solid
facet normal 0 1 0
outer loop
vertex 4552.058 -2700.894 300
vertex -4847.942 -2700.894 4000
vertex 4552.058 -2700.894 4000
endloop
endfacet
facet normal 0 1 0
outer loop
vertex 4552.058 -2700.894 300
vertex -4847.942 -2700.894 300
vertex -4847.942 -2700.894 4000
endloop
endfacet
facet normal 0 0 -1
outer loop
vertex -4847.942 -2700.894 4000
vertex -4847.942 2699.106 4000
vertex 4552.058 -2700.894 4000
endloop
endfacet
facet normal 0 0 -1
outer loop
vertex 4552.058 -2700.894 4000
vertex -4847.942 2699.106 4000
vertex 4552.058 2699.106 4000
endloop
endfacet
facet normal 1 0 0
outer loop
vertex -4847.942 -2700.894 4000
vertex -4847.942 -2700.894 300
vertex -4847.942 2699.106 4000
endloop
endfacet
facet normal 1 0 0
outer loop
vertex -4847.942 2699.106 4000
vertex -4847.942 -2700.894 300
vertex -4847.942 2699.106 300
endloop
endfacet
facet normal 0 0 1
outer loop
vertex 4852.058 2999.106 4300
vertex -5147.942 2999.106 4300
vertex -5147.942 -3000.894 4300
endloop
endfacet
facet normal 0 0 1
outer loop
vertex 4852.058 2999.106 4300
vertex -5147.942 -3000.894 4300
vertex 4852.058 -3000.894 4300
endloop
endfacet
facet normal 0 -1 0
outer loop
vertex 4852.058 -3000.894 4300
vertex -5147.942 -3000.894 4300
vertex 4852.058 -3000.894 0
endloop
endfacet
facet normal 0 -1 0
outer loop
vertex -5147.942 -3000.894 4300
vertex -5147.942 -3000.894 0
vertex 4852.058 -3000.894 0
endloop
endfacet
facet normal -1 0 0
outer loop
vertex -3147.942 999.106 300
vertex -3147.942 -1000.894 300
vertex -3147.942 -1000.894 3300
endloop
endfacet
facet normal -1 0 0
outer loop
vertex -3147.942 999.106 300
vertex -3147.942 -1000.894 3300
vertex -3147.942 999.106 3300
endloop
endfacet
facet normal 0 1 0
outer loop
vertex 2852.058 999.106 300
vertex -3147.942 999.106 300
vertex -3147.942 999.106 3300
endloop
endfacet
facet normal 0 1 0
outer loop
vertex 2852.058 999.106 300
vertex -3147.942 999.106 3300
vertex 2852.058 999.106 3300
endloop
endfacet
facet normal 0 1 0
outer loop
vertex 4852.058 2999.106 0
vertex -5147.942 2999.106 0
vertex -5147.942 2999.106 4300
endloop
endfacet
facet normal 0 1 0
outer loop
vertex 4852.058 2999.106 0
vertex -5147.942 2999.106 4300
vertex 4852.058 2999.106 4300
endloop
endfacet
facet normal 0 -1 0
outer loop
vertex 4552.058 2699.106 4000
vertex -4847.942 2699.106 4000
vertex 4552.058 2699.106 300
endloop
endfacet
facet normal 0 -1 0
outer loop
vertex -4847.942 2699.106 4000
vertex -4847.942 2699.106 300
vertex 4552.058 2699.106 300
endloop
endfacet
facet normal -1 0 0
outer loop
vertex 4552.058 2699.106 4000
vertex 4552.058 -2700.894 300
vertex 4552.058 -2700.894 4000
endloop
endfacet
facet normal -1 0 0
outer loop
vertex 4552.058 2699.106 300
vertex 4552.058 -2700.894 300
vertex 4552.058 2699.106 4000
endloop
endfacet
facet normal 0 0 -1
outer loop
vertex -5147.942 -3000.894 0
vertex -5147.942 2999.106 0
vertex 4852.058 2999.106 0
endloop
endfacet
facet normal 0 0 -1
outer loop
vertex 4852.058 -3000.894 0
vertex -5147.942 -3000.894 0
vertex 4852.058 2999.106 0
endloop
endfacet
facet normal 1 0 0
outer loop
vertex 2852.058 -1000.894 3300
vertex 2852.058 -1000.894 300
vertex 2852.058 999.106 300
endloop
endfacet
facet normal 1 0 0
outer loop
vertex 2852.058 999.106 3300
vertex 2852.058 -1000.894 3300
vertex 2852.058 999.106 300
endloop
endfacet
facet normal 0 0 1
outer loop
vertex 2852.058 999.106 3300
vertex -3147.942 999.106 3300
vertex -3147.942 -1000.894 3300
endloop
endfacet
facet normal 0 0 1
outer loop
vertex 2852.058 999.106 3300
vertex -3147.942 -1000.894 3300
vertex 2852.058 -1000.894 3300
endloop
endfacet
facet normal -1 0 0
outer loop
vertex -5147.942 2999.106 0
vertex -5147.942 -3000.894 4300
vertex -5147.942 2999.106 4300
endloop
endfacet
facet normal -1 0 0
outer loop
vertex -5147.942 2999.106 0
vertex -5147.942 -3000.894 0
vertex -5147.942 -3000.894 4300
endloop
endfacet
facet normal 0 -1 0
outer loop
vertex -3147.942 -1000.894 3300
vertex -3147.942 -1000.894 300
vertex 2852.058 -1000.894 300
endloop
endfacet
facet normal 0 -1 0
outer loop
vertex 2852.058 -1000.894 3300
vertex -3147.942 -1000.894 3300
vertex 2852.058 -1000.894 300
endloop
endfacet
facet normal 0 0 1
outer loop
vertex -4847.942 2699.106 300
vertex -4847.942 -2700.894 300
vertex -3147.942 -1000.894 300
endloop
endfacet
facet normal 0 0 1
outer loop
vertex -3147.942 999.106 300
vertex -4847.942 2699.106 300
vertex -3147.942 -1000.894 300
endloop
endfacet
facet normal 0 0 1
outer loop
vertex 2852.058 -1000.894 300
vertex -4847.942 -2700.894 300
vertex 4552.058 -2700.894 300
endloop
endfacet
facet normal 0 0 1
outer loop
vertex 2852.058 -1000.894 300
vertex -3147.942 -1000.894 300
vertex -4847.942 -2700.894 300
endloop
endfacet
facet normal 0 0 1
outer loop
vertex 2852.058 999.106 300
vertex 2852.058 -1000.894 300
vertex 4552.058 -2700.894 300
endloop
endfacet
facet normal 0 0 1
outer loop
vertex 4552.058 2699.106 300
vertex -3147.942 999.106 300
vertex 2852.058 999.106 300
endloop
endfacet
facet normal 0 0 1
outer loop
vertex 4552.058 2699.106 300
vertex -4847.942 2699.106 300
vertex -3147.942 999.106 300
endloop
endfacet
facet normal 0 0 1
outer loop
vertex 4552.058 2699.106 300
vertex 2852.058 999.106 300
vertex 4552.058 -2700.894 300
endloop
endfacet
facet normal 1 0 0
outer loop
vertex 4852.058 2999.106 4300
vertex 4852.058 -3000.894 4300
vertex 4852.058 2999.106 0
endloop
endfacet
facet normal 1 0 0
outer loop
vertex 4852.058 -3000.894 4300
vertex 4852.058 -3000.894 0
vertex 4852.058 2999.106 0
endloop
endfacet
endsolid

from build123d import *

# Parameters (mm, degrees)
F0_W     = 10000
F0_H     = 6000
F1_DEPTH = 4000
F2_T     = -300
F3_W     = 6000
F3_H     = 2000
F4_DEPTH = 3000
F5_W     = 10000
F5_H     = 6000
F5_W_2   = 9400
F5_H_2   = 5400
F6_DEPTH = 300


with BuildPart() as f1:
    # F0 (on Top) → F1 (new body)
    with BuildSketch(Plane.XY):
        with Locations((-147.9424615742, -0.8937958628)):
            Rectangle(F0_W, F0_H)
    extrude(amount=F1_DEPTH)

    # F2
    f2_openings = [f1.faces().sort_by_distance(p)[0] for p in [
        (-147.942462, -0.893796, 4000),
    ]]
    offset(amount=F2_T, openings=f2_openings)

    # F3 (on face) → F4 (join)
    with BuildSketch(Plane.XY.offset(300)):
        with Locations((-147.9424615742, -0.8937958628)):
            Rectangle(F3_W, F3_H)
    extrude(amount=F4_DEPTH)

    # F5 (on face) → F6 (join)
    with BuildSketch(Plane.XY.offset(4000)):
        with Locations((-147.9424615742, -0.8937958628)):
            Rectangle(F5_W, F5_H)
        with Locations((-147.9424615742, -0.8937958628)):
            Rectangle(F5_W_2, F5_H_2, mode=Mode.SUBTRACT)
        with Locations((-147.9424615742, -0.8937958628)):
            Rectangle(F5_W_2, F5_H_2)
    extrude(amount=F6_DEPTH)


solid = f1.part
